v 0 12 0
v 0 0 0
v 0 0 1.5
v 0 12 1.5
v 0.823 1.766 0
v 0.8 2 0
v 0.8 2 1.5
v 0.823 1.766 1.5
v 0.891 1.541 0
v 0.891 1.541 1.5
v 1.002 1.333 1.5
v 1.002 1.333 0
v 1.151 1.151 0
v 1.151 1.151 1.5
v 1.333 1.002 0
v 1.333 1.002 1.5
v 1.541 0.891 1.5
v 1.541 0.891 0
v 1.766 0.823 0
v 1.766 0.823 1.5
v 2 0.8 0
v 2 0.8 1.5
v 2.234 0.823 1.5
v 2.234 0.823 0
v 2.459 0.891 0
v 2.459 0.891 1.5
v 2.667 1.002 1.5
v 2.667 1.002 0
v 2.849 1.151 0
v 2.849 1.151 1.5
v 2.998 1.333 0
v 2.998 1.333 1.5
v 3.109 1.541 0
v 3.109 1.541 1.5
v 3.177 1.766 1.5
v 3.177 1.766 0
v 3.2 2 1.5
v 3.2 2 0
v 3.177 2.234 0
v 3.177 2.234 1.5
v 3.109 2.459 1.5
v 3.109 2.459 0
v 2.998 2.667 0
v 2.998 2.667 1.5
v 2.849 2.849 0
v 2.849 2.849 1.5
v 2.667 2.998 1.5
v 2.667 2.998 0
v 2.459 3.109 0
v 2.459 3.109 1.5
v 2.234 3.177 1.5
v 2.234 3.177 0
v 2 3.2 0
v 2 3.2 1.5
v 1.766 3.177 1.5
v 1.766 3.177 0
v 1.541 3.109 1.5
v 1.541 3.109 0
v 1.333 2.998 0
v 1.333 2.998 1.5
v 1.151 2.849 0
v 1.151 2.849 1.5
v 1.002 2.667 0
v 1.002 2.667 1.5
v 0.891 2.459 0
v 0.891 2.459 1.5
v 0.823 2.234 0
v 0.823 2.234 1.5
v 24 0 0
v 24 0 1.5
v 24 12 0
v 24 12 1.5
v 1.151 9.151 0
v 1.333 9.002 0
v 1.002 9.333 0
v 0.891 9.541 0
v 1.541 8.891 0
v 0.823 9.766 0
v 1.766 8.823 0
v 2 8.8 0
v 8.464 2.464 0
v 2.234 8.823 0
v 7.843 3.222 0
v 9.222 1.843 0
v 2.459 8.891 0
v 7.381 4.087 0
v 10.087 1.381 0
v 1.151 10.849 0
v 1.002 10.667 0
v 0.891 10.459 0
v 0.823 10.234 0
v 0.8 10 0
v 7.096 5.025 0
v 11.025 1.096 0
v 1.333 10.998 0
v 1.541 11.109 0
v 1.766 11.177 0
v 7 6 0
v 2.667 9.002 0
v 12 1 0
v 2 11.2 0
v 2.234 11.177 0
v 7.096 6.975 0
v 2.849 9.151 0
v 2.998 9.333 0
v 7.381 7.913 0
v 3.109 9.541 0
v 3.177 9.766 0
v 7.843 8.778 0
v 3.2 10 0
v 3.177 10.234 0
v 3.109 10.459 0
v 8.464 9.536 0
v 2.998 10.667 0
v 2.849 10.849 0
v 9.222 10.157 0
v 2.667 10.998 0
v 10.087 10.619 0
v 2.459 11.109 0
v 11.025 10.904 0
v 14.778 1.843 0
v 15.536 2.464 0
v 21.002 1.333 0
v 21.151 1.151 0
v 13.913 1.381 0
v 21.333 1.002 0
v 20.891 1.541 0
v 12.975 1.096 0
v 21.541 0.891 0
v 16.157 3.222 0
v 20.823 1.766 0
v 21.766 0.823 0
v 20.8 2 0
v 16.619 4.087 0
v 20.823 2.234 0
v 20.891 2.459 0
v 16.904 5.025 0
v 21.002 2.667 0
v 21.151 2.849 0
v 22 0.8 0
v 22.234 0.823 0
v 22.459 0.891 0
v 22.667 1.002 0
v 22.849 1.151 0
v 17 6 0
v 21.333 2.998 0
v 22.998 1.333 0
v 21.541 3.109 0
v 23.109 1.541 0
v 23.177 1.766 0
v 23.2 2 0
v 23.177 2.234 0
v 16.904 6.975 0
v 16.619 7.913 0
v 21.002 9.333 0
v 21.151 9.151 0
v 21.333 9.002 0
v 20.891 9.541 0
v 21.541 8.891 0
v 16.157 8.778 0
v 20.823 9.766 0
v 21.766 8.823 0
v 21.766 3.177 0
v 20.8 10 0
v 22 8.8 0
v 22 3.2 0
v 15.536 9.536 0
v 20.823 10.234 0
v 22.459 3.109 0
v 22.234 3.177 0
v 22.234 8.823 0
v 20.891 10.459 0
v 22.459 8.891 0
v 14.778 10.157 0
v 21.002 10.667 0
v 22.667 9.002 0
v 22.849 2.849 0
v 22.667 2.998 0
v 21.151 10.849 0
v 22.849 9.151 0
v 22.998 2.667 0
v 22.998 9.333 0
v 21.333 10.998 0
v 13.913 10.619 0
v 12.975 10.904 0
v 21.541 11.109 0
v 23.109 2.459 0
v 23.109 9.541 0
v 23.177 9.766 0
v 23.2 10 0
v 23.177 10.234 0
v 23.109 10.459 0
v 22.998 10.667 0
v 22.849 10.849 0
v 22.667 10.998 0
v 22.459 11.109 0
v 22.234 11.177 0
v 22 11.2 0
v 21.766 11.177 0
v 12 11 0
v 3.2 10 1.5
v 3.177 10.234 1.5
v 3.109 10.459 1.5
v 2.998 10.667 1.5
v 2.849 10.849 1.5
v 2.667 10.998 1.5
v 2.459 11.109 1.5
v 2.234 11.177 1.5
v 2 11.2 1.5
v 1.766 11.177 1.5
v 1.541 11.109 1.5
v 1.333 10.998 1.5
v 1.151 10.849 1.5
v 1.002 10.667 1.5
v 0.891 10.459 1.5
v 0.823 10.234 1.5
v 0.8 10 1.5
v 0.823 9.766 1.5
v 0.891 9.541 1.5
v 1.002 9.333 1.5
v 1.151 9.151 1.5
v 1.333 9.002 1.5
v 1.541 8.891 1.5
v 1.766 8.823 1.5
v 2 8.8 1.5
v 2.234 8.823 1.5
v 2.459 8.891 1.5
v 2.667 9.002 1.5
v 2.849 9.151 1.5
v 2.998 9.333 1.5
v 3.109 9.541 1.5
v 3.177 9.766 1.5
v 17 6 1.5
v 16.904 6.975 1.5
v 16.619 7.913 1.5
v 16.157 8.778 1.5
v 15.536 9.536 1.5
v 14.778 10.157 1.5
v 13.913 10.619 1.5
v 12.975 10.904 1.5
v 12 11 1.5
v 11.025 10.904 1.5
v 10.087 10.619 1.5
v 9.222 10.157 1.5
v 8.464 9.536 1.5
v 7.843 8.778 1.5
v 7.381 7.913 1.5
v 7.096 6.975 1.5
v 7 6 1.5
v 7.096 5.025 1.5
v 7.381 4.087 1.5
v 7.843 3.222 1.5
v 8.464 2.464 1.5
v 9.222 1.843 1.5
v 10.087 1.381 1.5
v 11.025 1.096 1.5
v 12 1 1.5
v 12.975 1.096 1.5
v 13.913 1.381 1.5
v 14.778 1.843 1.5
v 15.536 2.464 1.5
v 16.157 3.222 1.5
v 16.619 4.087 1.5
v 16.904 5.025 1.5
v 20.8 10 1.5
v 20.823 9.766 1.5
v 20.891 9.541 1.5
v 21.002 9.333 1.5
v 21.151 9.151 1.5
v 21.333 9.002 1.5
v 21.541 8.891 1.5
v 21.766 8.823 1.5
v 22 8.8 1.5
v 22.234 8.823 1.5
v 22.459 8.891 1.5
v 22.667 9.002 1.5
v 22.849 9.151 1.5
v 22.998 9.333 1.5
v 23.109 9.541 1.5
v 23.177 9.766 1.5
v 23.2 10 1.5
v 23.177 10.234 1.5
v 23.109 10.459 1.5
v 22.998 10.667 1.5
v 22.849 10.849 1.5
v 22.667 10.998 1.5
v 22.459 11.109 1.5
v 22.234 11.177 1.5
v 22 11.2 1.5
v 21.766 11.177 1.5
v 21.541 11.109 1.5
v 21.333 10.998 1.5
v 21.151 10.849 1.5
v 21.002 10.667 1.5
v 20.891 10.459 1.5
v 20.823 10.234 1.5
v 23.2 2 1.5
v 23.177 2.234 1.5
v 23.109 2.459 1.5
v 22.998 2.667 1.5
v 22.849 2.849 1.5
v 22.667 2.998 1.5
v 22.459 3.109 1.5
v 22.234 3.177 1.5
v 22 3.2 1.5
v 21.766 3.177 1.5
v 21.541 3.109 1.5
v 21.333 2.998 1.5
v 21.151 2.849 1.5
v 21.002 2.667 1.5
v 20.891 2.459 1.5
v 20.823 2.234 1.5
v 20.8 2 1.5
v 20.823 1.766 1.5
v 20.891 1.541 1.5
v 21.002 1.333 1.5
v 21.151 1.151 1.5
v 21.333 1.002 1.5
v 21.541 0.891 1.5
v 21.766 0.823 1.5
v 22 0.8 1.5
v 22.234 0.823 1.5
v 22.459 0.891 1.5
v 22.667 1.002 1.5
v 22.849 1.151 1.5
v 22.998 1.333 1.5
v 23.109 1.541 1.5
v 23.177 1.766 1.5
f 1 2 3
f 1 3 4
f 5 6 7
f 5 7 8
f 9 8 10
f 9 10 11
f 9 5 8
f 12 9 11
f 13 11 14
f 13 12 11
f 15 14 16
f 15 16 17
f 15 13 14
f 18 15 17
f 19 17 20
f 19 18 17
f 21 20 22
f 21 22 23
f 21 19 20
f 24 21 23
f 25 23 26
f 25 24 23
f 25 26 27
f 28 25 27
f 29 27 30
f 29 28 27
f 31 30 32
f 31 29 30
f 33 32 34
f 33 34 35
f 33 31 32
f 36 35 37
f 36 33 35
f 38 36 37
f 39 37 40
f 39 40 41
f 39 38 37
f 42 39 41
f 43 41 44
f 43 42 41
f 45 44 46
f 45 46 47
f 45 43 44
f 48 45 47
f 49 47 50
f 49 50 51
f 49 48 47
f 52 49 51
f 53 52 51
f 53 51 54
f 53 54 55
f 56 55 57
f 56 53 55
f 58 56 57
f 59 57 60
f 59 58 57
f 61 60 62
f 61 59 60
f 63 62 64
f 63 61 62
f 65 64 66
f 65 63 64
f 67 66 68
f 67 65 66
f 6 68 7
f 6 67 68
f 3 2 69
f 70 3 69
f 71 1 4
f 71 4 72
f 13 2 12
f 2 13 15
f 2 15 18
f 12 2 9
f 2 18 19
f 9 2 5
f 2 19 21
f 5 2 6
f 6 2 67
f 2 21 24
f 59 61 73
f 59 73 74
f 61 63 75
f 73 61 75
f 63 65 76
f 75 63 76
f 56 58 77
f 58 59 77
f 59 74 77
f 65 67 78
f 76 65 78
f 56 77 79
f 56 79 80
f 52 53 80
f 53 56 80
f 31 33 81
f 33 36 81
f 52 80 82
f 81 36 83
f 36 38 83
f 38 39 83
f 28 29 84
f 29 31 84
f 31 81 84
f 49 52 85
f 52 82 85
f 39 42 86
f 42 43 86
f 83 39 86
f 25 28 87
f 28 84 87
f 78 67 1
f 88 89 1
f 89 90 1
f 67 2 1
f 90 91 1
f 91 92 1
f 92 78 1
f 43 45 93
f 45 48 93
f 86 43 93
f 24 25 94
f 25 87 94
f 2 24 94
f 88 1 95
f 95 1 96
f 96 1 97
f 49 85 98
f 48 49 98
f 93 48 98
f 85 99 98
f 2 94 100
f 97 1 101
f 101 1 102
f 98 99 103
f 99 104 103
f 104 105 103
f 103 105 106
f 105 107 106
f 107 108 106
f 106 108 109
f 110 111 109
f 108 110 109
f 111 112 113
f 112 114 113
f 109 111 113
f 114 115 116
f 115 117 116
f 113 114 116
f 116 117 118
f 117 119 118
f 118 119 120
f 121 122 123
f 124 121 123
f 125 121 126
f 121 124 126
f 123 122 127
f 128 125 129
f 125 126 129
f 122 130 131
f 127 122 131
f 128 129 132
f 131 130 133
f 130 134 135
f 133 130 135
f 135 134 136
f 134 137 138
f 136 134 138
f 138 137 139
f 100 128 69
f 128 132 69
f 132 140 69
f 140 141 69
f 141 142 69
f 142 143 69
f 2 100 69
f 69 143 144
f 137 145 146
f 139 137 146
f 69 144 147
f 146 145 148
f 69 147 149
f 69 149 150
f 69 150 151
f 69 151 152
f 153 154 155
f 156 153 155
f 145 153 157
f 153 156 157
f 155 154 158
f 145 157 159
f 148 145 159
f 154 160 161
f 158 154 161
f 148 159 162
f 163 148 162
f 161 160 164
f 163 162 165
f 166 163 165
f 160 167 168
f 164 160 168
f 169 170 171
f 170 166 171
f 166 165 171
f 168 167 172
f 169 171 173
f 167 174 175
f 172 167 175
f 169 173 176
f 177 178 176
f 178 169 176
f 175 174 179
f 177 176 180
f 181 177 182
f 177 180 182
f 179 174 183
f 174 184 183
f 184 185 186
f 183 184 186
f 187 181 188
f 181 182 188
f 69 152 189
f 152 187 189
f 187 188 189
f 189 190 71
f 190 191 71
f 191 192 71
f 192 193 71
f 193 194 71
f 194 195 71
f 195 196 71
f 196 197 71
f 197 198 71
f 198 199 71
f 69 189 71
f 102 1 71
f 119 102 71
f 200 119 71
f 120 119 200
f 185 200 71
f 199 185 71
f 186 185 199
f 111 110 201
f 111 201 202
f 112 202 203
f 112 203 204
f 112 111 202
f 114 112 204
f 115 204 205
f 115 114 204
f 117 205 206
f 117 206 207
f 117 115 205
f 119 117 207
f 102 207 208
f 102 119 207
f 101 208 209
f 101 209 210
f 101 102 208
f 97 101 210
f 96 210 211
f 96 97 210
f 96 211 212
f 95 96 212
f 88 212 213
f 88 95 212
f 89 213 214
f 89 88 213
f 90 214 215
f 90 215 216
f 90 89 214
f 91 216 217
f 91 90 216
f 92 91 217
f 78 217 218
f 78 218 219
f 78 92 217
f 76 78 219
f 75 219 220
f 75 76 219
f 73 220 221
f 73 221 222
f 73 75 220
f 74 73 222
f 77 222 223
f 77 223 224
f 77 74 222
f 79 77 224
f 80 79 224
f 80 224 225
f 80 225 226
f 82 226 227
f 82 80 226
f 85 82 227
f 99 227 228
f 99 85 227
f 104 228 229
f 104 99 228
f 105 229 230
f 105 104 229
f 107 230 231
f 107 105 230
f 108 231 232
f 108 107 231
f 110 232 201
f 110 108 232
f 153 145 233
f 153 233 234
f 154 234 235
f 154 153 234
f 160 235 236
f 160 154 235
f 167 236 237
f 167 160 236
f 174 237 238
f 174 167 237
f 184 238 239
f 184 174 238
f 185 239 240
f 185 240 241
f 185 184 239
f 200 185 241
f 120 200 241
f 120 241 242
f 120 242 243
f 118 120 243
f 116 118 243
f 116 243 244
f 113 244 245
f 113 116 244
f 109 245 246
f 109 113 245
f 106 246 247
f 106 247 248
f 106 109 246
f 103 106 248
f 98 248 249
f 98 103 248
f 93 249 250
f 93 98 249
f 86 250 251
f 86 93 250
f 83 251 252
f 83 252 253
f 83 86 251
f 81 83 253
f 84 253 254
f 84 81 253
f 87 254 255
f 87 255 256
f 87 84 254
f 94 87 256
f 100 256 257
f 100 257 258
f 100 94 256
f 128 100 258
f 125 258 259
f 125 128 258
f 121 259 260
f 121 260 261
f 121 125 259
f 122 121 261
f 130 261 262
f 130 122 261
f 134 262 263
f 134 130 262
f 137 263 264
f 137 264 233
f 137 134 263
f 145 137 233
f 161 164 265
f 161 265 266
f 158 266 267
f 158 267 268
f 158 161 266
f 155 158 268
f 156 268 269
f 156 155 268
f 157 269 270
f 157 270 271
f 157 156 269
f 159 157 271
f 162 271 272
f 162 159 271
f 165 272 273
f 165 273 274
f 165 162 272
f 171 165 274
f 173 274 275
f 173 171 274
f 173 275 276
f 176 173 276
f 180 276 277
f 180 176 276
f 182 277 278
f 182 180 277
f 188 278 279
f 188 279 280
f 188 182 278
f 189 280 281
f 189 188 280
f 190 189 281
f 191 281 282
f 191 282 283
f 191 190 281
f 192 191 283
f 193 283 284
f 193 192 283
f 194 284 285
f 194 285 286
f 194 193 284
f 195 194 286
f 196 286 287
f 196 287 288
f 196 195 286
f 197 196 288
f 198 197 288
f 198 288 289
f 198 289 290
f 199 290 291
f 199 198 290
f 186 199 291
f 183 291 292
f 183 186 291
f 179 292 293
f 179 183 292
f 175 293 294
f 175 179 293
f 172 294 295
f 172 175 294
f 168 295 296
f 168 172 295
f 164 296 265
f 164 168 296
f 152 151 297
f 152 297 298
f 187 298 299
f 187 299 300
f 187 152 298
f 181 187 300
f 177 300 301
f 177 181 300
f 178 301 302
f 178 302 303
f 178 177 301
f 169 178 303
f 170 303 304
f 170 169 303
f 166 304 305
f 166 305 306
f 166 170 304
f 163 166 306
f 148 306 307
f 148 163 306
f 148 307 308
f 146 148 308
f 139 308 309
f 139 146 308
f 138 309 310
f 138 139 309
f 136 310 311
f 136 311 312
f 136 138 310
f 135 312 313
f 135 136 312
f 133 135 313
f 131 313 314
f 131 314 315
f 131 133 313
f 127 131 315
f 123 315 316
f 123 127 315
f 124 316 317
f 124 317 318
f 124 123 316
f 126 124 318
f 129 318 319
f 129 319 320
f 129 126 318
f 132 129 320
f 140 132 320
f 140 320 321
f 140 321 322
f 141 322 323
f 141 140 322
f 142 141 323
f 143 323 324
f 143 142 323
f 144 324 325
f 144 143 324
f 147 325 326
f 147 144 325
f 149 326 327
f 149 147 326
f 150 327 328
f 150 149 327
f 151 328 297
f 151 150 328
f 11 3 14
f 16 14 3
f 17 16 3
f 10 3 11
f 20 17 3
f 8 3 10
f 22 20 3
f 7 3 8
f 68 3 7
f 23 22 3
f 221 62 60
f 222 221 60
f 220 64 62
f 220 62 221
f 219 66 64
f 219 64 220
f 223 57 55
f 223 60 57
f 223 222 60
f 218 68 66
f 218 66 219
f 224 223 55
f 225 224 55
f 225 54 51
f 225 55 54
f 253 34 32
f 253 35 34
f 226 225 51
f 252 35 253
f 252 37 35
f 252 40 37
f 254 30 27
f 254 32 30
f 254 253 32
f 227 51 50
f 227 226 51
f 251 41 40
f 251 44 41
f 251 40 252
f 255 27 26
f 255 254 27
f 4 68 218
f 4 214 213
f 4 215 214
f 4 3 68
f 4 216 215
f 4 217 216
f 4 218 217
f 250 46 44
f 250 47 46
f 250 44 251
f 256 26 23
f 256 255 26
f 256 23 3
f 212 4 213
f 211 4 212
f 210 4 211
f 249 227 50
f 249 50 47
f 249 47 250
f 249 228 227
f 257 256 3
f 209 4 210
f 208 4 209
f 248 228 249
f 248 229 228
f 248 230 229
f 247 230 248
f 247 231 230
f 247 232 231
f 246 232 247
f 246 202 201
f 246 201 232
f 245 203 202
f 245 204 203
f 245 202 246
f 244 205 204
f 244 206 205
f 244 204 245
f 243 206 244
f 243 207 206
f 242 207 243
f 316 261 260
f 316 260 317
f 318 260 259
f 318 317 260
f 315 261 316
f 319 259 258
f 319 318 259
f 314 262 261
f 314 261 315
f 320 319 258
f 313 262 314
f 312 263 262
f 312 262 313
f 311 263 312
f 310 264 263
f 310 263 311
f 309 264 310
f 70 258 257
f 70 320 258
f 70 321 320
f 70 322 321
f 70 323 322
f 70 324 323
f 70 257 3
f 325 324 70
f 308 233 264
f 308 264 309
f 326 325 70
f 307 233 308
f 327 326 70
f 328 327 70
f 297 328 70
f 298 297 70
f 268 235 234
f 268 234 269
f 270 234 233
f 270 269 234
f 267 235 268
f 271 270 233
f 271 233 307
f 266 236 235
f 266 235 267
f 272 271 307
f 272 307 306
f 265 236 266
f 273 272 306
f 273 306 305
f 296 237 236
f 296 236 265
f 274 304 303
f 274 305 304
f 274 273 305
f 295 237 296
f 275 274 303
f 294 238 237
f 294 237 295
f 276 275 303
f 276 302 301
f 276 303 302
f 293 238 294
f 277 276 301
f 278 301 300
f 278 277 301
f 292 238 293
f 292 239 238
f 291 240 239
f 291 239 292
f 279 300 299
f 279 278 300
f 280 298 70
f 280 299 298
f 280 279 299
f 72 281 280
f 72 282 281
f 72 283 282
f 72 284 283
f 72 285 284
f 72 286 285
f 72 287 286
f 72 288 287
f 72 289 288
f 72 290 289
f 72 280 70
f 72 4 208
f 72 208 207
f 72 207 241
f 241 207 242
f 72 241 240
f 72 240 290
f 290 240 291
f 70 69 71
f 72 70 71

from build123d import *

# Parameters (mm, degrees)
SKETCH1_W           = 24
SKETCH1_H           = 12
SKETCH1_R           = 1.2
SKETCH1_R_2         = 5
BOSS_EXTRUDE1_DEPTH = 1.5


with BuildPart() as part:
    # Sketch1 → Boss-Extrude1 (new body)
    with BuildSketch(Plane.XY):
        with Locations((12, 6)):
            Rectangle(SKETCH1_W, SKETCH1_H)
        with Locations((2, 10)):
            Circle(SKETCH1_R, mode=Mode.SUBTRACT)
        with Locations(Location((22, 10, 0), (0, 0, 180))):
            Circle(SKETCH1_R, mode=Mode.SUBTRACT)
        with Locations((22, 2)):
            Circle(SKETCH1_R, mode=Mode.SUBTRACT)
        with Locations(Location((2, 2, 0), (0, 0, 180))):
            Circle(SKETCH1_R, mode=Mode.SUBTRACT)
        with Locations((12, 6)):
            Circle(SKETCH1_R_2, mode=Mode.SUBTRACT)
    extrude(amount=BOSS_EXTRUDE1_DEPTH)


solid = part.part
